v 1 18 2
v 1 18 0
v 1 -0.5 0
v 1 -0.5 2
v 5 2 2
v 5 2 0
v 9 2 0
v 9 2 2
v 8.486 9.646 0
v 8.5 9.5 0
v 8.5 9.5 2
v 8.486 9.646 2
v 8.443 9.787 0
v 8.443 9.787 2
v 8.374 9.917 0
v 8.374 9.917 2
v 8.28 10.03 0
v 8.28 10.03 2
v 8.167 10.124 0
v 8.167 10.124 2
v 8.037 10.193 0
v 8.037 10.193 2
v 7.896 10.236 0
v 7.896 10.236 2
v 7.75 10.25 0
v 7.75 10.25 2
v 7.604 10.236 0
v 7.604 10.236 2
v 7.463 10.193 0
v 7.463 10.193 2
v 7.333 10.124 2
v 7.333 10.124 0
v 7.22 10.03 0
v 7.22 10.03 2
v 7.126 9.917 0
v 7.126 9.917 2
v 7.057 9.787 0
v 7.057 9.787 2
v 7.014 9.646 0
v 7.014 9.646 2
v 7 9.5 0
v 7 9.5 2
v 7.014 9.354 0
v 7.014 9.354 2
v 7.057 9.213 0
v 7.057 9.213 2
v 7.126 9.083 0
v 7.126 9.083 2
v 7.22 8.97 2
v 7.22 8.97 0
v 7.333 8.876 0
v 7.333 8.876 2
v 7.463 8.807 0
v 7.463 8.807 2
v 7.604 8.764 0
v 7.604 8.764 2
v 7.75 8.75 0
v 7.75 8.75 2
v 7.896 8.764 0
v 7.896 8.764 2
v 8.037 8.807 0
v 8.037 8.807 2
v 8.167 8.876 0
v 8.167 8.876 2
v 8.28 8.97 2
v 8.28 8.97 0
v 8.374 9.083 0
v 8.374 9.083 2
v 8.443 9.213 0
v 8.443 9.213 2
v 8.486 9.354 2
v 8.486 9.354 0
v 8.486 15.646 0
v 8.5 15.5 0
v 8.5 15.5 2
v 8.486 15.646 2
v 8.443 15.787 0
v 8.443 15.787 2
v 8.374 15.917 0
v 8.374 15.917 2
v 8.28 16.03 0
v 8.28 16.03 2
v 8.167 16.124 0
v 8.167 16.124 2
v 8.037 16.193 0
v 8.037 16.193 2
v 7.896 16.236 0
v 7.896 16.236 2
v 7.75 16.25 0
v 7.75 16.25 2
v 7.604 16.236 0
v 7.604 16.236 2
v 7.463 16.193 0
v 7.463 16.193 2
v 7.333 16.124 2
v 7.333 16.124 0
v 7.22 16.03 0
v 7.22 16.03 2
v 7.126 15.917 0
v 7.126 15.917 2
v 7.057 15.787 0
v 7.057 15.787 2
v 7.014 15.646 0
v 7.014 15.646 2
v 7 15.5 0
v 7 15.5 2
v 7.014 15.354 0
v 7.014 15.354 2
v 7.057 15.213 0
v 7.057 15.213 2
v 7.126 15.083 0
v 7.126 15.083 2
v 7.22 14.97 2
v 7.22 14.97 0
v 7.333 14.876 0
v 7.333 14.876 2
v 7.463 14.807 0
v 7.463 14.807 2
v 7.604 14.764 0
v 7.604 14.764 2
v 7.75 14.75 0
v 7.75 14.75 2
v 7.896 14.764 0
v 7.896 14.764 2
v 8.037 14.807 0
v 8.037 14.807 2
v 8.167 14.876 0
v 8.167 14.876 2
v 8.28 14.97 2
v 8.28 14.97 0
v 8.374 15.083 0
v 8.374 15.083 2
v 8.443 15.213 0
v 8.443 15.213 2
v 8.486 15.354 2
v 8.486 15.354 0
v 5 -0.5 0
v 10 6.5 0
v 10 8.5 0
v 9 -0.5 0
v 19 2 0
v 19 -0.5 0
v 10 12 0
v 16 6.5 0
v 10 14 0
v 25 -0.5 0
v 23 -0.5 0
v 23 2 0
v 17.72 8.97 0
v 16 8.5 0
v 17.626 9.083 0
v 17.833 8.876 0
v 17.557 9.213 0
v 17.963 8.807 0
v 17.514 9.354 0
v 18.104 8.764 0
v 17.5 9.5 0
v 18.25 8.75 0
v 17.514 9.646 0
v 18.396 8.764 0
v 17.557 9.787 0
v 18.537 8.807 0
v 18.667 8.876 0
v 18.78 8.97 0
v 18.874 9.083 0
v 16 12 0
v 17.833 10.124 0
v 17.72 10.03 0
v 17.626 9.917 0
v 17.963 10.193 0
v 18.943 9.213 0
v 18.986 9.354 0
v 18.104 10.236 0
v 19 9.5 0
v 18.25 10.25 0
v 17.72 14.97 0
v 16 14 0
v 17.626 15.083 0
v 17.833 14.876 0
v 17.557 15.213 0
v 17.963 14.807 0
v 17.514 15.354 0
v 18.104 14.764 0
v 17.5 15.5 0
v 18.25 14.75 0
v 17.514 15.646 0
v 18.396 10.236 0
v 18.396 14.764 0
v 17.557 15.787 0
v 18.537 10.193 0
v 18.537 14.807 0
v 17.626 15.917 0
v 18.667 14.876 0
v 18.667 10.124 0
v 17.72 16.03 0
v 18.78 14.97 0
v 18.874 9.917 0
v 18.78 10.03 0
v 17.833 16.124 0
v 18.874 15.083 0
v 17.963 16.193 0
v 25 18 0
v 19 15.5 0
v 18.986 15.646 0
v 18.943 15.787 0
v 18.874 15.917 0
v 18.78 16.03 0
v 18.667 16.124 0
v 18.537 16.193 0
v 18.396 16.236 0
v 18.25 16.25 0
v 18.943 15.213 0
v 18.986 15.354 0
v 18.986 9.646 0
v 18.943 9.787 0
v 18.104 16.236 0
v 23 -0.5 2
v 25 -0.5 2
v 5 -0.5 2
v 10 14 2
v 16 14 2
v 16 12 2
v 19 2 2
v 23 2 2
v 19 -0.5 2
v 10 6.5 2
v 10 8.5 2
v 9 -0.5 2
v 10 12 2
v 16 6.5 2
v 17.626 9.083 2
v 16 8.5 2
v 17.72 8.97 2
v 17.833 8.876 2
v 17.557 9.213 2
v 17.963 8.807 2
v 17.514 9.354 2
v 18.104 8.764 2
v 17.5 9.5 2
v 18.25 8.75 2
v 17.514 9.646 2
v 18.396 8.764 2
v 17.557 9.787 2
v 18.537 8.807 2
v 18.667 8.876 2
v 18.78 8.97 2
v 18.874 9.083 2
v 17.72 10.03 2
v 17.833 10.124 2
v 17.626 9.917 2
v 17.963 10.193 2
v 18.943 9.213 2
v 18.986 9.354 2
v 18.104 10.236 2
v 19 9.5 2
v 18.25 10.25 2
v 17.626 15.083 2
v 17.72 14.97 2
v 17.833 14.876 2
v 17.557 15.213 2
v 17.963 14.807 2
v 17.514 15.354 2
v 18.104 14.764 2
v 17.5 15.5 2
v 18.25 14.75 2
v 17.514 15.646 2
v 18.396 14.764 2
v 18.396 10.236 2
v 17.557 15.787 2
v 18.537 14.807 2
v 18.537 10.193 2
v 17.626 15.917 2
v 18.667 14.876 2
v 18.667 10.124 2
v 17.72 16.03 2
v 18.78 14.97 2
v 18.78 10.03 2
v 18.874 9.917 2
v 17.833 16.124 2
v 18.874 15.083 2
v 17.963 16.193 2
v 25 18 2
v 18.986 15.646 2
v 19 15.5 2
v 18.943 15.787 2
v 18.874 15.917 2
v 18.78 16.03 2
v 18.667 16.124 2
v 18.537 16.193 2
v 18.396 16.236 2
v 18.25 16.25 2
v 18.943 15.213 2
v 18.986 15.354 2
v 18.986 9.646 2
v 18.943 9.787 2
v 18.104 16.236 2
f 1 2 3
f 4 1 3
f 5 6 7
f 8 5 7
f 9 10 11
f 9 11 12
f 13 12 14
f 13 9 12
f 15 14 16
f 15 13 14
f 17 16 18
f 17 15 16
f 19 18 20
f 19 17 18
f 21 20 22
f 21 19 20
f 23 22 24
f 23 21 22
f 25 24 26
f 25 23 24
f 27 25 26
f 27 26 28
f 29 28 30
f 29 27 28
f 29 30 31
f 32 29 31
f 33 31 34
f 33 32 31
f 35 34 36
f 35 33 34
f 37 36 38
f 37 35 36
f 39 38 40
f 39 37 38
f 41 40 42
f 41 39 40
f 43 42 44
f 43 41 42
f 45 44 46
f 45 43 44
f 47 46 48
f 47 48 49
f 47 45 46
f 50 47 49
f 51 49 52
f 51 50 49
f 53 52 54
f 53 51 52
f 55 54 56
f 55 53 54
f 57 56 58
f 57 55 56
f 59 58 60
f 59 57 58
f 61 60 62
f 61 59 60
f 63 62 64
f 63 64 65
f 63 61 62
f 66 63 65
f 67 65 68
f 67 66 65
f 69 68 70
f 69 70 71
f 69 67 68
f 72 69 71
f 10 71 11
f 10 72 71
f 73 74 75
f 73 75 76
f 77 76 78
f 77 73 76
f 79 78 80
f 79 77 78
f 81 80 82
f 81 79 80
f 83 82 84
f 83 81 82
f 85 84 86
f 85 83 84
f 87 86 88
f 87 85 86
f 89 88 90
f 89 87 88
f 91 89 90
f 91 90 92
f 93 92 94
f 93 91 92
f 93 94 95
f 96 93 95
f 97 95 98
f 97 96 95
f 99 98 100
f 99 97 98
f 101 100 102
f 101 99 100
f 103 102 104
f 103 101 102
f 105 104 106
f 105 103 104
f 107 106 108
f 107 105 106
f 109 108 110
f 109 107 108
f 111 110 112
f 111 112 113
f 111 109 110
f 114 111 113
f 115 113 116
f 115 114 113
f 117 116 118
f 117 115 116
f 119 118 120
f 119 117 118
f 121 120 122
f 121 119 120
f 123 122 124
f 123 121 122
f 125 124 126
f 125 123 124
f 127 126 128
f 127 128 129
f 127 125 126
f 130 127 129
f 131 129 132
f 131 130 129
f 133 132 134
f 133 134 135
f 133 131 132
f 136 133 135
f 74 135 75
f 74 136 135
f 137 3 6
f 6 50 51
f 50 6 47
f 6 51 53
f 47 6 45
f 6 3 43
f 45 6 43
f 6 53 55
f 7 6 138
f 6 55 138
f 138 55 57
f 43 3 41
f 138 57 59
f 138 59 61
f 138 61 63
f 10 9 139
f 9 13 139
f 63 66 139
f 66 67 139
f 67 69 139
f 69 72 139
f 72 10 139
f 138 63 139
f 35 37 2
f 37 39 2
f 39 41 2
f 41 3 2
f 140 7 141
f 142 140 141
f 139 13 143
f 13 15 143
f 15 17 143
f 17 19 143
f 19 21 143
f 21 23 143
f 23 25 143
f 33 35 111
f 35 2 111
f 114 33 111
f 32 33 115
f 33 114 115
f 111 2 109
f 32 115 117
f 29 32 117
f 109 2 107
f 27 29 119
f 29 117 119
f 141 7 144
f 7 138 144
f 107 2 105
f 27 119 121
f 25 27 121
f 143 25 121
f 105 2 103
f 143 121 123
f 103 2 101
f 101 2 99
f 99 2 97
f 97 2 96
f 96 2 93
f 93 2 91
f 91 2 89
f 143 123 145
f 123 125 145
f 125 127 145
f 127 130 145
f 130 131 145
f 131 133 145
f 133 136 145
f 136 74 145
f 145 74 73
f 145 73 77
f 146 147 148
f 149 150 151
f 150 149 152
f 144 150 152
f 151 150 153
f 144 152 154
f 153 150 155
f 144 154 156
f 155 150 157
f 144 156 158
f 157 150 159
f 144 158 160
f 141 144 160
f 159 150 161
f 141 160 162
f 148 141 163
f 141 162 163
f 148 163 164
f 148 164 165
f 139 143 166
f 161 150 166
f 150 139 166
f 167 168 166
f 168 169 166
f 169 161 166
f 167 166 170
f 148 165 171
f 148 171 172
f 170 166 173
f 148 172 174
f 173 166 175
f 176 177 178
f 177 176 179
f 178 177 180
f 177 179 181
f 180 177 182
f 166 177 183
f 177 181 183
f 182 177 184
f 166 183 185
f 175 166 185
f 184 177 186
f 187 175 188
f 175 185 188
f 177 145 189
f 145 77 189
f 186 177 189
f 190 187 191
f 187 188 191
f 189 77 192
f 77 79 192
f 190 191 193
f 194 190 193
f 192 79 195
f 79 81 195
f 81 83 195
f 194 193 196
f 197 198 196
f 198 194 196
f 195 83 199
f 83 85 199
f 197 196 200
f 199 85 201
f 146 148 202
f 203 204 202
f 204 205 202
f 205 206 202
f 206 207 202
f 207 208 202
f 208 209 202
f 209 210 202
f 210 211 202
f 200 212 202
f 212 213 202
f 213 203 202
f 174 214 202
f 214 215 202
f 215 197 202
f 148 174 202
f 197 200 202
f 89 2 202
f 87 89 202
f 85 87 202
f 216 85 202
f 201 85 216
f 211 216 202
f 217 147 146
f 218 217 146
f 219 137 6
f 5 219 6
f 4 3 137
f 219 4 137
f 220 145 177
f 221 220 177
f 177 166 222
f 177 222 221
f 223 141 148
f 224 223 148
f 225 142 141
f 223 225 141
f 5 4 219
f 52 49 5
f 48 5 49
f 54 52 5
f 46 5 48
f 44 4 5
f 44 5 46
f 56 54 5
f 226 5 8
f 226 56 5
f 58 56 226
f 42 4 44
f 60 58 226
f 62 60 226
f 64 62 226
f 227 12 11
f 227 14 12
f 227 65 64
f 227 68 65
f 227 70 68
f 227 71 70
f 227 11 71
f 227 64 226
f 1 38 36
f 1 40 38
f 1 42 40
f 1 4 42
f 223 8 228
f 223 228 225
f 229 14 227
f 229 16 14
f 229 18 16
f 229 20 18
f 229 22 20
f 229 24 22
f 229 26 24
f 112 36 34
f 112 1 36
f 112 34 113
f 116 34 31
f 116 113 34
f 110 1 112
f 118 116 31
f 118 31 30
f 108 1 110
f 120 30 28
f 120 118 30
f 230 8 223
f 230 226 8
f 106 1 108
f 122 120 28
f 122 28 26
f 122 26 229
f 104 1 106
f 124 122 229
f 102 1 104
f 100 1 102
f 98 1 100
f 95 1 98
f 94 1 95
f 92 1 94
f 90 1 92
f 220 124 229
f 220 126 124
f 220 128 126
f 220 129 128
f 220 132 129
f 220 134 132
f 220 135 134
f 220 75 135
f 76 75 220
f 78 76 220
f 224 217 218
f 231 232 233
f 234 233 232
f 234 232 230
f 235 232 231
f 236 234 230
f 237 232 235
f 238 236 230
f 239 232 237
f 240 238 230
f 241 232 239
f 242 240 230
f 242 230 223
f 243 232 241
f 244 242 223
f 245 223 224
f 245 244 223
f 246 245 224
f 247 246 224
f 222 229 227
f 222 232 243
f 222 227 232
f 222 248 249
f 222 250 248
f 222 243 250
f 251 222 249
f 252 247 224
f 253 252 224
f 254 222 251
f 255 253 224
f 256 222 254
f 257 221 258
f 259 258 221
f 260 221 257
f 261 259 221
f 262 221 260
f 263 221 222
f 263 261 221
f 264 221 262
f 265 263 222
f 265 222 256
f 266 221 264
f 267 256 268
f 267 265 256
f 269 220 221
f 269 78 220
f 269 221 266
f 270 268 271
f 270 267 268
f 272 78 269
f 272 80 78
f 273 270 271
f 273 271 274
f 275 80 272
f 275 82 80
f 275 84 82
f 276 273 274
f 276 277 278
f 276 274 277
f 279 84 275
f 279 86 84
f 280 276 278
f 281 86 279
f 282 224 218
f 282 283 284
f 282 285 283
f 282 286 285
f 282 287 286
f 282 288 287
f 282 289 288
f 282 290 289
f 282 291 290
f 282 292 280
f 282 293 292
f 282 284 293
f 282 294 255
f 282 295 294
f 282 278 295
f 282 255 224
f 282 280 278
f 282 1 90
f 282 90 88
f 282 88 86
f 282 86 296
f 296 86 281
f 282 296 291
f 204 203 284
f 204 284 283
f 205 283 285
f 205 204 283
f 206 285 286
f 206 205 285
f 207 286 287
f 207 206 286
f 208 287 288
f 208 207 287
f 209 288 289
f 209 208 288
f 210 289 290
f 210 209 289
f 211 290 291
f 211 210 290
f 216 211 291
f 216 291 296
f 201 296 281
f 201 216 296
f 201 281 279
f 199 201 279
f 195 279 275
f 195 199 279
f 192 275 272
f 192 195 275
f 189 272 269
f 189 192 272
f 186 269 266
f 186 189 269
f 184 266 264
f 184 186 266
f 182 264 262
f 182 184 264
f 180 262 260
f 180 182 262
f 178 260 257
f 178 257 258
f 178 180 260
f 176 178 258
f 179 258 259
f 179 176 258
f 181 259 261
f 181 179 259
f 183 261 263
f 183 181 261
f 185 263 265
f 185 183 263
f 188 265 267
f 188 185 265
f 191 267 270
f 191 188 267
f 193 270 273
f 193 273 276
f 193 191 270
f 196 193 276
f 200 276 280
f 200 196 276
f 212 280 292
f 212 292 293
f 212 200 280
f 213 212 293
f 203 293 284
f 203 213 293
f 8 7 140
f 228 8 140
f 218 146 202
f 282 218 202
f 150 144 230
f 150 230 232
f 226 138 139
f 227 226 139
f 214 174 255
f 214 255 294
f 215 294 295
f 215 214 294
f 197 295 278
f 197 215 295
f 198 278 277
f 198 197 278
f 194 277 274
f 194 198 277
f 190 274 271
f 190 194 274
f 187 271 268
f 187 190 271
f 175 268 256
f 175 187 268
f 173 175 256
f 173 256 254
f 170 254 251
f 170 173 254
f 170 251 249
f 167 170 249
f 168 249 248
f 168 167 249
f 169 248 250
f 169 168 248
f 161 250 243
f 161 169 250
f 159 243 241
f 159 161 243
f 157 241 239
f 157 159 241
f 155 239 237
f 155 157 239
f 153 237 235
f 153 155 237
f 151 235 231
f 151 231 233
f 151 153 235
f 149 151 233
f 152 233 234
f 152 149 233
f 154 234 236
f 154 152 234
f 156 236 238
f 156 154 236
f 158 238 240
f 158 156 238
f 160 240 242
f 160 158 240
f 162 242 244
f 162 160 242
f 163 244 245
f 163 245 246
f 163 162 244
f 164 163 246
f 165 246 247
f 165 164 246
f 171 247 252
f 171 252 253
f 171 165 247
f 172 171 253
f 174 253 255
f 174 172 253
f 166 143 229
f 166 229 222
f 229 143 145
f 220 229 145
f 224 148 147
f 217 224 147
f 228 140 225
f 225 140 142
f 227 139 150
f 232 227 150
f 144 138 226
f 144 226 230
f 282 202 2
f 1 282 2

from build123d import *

# Parameters (mm, degrees)
SKETCH1_R           = 0.75
SKETCH1_W           = 6
SKETCH1_H           = 2
BOSS_EXTRUDE1_DEPTH = 2


with BuildPart() as part:
    # Sketch1 → Boss-Extrude1 (new body)
    with BuildSketch(Plane.XY):
        Polygon((5, 2), (9, 2), (9, -0.5), (19, -0.5), (19, 2), (23, 2), (23, -0.5), (25, -0.5), (25, 18), (1, 18), (1, -0.5), (5, -0.5), align=None)
        with Locations((7.75, 15.5)):
            Circle(SKETCH1_R, mode=Mode.SUBTRACT)
        with Locations((18.25, 15.5)):
            Circle(SKETCH1_R, mode=Mode.SUBTRACT)
        with Locations((18.25, 9.5)):
            Circle(SKETCH1_R, mode=Mode.SUBTRACT)
        with Locations((7.75, 9.5)):
            Circle(SKETCH1_R, mode=Mode.SUBTRACT)
        with Locations((13, 13)):
            Rectangle(SKETCH1_W, SKETCH1_H, mode=Mode.SUBTRACT)
        with Locations((13, 7.5)):
            Rectangle(SKETCH1_W, SKETCH1_H, mode=Mode.SUBTRACT)
    extrude(amount=BOSS_EXTRUDE1_DEPTH)


solid = part.part
